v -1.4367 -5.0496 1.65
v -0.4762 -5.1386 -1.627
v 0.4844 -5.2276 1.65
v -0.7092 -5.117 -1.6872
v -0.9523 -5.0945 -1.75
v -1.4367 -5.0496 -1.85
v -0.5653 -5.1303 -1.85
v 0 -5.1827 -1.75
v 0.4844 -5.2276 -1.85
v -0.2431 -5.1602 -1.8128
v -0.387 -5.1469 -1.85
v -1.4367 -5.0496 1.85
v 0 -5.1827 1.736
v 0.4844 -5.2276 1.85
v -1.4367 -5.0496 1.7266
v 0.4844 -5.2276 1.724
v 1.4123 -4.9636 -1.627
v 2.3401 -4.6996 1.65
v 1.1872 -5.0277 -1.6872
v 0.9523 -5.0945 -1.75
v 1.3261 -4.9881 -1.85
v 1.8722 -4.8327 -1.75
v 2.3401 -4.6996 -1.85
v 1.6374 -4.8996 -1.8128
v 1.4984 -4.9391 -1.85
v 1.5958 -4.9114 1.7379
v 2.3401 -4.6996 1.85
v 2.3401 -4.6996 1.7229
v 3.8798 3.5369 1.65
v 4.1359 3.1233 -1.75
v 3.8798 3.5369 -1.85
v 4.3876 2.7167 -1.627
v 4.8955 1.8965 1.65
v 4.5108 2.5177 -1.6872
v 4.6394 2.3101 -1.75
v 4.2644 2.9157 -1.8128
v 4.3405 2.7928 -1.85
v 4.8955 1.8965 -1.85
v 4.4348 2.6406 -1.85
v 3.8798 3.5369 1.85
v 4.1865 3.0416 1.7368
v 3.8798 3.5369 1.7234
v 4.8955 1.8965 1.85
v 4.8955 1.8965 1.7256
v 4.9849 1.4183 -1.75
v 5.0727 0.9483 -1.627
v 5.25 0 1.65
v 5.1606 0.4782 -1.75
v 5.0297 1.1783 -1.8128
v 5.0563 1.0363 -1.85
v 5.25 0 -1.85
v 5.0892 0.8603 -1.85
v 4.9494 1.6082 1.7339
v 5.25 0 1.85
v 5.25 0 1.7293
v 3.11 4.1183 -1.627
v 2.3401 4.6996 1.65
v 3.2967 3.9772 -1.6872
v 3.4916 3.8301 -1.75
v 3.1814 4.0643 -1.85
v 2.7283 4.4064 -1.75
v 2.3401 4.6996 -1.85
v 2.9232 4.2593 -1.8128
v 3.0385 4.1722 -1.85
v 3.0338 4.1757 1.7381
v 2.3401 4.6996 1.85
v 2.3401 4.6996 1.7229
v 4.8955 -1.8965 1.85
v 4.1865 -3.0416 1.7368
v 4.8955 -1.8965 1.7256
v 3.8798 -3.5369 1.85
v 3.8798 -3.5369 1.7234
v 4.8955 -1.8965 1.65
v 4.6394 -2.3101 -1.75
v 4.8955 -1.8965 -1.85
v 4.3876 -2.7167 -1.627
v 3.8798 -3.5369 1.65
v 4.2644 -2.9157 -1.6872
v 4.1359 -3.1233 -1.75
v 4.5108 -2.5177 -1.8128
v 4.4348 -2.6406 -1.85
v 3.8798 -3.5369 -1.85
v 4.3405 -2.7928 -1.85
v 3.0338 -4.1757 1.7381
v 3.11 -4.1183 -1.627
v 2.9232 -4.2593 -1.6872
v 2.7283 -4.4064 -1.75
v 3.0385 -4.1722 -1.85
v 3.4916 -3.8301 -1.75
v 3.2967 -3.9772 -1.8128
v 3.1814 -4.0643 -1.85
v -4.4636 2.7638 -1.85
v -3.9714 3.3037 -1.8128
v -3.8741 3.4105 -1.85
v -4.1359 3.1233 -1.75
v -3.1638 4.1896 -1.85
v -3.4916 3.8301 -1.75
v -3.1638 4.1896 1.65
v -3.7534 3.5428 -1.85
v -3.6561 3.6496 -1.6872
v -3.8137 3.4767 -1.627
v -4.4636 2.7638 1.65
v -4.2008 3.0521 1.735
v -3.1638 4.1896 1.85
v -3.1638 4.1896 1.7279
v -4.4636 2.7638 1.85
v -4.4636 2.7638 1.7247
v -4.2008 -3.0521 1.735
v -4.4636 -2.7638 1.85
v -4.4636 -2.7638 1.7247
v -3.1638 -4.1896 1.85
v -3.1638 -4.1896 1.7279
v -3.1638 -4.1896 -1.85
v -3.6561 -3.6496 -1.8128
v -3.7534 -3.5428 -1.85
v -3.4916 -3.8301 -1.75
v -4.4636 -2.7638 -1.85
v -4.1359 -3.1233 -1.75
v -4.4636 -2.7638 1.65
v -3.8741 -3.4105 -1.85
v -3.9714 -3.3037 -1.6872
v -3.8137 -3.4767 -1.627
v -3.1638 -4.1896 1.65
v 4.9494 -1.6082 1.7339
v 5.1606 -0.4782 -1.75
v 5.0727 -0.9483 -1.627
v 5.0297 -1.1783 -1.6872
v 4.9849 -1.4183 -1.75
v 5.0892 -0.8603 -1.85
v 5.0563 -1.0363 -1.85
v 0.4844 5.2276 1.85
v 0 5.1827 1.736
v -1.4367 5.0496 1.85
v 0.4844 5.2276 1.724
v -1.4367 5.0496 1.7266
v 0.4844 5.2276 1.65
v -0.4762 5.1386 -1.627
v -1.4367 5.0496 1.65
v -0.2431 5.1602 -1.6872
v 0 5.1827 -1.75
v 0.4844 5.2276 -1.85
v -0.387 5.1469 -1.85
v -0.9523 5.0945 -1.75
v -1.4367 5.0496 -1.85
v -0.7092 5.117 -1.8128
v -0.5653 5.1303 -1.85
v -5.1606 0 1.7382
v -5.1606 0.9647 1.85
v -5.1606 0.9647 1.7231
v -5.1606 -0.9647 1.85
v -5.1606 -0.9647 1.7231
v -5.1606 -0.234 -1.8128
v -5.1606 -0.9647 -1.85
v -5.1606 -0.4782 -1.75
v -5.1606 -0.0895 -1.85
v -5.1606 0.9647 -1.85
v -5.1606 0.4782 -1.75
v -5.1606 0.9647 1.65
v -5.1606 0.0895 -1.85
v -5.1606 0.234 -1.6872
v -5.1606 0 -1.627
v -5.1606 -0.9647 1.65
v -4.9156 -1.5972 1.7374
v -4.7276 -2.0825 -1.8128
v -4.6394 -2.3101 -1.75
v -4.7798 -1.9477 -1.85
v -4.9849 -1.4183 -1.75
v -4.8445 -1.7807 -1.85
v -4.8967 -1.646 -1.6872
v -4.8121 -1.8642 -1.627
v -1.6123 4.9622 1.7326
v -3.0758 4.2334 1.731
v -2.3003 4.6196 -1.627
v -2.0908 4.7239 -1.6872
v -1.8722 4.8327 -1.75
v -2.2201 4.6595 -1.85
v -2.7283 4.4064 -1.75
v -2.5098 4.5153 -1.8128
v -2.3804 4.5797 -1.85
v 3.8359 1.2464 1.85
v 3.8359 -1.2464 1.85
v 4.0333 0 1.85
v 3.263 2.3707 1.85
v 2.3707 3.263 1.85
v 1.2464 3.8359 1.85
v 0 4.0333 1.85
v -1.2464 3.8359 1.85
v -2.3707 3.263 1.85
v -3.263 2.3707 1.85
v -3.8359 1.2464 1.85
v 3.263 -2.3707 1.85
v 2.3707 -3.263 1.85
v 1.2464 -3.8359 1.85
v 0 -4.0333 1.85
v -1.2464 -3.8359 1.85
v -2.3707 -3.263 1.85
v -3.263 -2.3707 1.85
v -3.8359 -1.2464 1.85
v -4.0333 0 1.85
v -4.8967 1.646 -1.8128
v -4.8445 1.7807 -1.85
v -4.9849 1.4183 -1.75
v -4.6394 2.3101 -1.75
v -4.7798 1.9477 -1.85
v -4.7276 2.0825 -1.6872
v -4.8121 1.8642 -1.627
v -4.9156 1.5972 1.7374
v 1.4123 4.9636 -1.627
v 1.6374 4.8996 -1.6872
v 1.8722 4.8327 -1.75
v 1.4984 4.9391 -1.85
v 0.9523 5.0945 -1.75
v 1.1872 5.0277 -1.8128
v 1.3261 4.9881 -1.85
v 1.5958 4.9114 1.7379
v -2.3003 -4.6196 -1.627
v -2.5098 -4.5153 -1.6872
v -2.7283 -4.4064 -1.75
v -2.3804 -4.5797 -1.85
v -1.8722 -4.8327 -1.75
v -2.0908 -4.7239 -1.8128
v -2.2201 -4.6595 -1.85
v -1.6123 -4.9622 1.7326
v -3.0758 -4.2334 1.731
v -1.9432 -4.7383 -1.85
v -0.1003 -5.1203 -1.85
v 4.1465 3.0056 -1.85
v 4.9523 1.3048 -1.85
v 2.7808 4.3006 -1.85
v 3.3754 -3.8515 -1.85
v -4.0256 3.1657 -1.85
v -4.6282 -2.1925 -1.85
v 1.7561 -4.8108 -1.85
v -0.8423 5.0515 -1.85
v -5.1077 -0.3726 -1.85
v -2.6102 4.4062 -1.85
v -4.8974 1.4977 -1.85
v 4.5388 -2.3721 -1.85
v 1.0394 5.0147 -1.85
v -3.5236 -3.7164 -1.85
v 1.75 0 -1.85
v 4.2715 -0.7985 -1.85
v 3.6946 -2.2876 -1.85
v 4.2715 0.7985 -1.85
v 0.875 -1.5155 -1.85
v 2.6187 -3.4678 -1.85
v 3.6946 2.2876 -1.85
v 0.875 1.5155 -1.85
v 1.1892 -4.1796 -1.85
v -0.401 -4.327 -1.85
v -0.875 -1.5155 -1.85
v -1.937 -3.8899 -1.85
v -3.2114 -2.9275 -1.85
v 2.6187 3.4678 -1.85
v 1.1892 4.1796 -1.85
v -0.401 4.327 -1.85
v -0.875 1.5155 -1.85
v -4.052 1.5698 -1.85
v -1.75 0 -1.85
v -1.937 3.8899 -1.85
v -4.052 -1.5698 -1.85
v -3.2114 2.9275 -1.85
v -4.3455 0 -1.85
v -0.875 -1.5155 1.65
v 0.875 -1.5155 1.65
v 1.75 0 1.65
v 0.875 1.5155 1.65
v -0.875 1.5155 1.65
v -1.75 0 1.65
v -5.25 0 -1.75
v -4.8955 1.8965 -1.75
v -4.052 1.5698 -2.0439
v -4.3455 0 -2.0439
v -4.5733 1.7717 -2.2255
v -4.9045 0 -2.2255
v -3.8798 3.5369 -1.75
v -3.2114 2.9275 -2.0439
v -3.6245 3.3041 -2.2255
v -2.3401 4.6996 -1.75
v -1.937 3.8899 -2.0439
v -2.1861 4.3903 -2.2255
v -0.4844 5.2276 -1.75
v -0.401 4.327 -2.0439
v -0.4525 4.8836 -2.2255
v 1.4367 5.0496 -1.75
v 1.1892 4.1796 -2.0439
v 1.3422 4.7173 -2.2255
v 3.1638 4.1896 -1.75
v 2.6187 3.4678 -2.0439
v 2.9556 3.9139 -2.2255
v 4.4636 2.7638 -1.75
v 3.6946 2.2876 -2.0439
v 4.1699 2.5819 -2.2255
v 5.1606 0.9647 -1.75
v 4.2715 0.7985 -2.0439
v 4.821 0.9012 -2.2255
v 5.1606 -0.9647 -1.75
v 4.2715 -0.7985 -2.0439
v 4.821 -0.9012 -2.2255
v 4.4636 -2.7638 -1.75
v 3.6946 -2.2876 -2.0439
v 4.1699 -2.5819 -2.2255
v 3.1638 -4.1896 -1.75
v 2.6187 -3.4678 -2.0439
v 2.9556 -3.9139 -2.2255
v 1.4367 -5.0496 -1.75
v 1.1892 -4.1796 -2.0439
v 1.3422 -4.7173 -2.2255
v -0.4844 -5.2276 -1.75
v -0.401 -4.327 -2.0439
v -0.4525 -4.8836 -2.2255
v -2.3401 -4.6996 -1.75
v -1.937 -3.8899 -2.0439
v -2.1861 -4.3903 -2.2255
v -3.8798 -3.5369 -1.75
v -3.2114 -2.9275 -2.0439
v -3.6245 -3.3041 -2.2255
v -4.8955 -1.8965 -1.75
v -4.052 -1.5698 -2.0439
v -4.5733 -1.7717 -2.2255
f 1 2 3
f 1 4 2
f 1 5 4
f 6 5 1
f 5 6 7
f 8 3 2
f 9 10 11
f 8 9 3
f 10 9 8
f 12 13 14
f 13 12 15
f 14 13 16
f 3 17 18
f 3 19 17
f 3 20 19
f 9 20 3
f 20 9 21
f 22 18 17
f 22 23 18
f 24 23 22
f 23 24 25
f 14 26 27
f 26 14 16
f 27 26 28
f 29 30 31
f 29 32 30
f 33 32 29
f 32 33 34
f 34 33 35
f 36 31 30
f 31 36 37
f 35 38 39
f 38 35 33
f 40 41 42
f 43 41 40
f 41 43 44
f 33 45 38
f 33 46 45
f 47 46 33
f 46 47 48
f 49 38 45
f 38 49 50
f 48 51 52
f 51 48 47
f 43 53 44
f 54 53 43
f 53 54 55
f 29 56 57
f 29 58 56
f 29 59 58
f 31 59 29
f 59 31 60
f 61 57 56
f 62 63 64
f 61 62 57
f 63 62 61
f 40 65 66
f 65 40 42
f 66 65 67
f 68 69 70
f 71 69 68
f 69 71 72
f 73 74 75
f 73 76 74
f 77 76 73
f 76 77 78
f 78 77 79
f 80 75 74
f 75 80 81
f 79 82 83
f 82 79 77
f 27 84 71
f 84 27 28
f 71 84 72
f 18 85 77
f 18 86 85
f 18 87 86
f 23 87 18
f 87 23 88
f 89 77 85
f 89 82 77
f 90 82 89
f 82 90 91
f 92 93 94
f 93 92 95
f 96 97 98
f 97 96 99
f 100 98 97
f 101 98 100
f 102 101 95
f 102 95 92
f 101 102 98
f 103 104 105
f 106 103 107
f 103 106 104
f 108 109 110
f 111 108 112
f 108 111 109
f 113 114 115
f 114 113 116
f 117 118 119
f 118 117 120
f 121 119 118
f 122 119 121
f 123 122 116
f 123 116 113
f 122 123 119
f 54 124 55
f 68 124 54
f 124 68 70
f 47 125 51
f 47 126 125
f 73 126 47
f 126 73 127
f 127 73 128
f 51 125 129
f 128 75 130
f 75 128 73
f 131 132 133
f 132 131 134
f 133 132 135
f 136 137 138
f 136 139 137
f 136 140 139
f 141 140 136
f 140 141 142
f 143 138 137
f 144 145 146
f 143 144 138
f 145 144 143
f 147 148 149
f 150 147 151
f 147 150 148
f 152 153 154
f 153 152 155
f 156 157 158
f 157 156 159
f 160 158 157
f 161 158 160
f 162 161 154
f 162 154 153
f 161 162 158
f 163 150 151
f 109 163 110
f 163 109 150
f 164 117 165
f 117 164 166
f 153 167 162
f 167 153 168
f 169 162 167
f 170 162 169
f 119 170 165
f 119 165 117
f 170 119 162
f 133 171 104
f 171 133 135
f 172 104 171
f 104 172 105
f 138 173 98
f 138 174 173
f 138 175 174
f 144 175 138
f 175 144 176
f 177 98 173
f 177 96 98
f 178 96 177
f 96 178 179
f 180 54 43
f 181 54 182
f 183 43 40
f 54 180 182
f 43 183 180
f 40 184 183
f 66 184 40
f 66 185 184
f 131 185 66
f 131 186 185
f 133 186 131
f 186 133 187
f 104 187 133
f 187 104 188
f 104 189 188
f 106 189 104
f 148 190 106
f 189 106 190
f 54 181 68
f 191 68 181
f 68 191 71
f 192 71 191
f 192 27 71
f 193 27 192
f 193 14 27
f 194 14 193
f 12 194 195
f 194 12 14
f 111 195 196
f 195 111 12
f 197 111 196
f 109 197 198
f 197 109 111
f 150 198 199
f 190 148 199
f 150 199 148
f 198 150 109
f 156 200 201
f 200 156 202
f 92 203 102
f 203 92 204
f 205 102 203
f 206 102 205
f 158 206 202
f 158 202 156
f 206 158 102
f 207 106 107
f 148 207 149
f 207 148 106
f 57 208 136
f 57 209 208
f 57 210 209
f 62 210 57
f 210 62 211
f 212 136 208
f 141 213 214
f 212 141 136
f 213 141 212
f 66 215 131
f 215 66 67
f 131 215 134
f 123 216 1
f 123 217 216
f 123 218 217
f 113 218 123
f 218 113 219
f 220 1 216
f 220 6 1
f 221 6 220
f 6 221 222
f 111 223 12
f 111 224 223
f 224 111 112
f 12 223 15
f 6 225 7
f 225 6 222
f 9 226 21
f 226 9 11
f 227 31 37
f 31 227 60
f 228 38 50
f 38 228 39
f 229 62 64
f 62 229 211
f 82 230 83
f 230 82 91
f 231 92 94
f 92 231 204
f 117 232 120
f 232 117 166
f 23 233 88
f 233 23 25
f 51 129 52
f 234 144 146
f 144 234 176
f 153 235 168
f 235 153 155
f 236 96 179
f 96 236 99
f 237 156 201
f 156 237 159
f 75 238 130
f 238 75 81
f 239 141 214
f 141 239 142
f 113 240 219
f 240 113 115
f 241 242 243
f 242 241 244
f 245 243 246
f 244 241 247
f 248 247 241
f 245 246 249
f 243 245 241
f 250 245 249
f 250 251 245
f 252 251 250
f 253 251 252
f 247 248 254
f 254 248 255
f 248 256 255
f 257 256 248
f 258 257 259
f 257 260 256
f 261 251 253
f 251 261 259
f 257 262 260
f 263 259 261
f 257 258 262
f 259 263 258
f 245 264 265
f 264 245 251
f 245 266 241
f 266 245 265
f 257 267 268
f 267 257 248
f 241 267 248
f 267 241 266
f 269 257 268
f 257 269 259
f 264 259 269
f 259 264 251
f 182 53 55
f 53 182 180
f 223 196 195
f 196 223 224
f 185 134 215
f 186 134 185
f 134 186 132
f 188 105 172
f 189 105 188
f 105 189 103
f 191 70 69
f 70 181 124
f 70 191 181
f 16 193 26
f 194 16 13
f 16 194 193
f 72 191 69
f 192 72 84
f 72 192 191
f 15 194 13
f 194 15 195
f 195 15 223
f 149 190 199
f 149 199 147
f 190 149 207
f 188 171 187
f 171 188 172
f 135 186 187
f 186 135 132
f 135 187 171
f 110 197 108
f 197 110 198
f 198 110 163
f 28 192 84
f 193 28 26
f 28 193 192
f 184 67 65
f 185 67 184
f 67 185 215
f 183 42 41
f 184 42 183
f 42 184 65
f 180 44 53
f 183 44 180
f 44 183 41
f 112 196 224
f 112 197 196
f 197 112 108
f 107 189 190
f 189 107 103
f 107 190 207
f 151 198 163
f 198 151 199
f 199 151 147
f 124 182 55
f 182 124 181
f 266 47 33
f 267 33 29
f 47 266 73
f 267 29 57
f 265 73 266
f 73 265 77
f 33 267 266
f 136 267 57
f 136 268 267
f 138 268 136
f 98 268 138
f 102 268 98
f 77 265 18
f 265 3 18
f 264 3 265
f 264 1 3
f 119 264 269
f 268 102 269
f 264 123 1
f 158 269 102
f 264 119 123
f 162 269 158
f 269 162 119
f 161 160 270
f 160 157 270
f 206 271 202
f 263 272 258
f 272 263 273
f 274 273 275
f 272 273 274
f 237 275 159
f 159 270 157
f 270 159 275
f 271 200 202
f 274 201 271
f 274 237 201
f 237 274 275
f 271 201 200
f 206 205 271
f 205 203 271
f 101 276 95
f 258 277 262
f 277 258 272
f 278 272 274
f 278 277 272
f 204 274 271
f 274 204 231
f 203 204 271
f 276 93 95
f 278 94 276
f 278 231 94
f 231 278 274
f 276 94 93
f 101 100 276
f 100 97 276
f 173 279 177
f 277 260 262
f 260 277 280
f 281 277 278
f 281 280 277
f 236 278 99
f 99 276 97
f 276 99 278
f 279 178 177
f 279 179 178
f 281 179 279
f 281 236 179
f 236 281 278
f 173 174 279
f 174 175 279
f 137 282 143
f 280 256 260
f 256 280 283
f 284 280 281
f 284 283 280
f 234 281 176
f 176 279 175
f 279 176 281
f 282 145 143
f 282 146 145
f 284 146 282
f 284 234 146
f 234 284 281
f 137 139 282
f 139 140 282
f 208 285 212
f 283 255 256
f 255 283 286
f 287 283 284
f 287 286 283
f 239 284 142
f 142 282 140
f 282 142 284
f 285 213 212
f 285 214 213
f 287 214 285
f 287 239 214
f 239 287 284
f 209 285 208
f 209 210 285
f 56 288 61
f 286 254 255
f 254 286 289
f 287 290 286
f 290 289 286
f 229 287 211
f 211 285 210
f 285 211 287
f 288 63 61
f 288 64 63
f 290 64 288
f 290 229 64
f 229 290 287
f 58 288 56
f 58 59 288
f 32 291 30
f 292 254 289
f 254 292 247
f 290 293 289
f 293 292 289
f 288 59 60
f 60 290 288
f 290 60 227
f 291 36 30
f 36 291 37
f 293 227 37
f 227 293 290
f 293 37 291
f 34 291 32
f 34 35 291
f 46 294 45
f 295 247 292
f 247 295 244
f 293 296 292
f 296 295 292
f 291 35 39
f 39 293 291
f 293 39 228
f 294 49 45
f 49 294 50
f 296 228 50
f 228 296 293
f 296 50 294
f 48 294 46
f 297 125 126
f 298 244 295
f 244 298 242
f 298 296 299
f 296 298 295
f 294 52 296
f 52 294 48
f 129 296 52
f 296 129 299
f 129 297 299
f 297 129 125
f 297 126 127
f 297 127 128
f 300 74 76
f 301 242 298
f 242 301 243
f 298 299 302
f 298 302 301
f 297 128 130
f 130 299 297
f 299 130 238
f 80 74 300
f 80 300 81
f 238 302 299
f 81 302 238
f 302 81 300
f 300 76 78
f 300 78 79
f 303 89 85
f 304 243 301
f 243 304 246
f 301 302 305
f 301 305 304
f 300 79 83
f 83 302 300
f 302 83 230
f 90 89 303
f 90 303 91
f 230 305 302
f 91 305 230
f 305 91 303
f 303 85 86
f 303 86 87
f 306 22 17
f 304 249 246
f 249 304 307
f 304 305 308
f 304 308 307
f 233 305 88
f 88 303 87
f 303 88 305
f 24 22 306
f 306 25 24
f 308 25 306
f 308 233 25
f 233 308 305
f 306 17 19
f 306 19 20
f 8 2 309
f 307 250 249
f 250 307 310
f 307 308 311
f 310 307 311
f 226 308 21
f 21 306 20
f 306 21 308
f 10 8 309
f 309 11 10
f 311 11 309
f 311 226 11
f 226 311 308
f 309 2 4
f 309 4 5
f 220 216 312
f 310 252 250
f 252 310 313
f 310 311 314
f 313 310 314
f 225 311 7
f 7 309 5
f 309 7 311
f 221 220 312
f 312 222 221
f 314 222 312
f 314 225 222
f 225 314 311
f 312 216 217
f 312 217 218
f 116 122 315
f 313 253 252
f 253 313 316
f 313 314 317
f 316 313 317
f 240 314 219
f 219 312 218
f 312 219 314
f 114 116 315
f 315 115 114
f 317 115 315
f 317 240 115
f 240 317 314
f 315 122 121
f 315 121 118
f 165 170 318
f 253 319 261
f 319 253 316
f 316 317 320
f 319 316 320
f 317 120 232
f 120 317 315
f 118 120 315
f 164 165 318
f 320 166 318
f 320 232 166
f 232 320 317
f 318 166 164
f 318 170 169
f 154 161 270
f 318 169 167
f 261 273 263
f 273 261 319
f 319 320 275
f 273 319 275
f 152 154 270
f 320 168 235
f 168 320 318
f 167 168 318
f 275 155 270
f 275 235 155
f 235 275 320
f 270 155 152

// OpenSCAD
// Parameters
outer_diameter = 10.5; //[5.25:21:0.1]
inner_diameter = 3.5; //[1.75:7:0.1]
height = 3.7; //[1.85:7.4:0.1]
outer_radius = 5.25; //[2.625:10.5:0.1]
inner_radius = 1.75; //[0.875:3.5:0.1]
overlap = 0.8; //[0.5:2:0.1]
chamfer_size = 0.6; //[0.3:1.2:0.1]
fillet_radius = 0.5; //[0.25:1:0.05]

// Base Shapes
module radial_outer_cyl() {
  translate([0, 0, 0])
    cylinder(h=height, r=outer_diameter/2, center=true);
}

module radial_inner_hole_cyl() {
  translate([0, 0, 0])
    cylinder(h=height + 2*overlap, r=inner_diameter/2, center=true);
}

module edge_chamfer_cyl() {
  translate([0, 0, height/2 - chamfer_size/2 + overlap/2])
    cylinder(h=chamfer_size, r1=outer_diameter/2 + overlap, r2=0, center=true);
}

module edge_fillet_torus() {
  translate([0, 0, -height/2 + fillet_radius - overlap/2])
    rotate_extrude() 
      translate([outer_diameter/2 - fillet_radius, 0, 0])
        circle(r=fillet_radius);
}

// Operations
module radial_body() {
  difference() {
    radial_outer_cyl();
    radial_inner_hole_cyl();
  }
}

module edge_chamfer() {
  difference() {
    radial_body();
    edge_chamfer_cyl();
  }
}

module edge_fillet() {
  union() {
    edge_chamfer();
    edge_fillet_torus();
  }
}

// Final Output
color("Silver") edge_fillet();
